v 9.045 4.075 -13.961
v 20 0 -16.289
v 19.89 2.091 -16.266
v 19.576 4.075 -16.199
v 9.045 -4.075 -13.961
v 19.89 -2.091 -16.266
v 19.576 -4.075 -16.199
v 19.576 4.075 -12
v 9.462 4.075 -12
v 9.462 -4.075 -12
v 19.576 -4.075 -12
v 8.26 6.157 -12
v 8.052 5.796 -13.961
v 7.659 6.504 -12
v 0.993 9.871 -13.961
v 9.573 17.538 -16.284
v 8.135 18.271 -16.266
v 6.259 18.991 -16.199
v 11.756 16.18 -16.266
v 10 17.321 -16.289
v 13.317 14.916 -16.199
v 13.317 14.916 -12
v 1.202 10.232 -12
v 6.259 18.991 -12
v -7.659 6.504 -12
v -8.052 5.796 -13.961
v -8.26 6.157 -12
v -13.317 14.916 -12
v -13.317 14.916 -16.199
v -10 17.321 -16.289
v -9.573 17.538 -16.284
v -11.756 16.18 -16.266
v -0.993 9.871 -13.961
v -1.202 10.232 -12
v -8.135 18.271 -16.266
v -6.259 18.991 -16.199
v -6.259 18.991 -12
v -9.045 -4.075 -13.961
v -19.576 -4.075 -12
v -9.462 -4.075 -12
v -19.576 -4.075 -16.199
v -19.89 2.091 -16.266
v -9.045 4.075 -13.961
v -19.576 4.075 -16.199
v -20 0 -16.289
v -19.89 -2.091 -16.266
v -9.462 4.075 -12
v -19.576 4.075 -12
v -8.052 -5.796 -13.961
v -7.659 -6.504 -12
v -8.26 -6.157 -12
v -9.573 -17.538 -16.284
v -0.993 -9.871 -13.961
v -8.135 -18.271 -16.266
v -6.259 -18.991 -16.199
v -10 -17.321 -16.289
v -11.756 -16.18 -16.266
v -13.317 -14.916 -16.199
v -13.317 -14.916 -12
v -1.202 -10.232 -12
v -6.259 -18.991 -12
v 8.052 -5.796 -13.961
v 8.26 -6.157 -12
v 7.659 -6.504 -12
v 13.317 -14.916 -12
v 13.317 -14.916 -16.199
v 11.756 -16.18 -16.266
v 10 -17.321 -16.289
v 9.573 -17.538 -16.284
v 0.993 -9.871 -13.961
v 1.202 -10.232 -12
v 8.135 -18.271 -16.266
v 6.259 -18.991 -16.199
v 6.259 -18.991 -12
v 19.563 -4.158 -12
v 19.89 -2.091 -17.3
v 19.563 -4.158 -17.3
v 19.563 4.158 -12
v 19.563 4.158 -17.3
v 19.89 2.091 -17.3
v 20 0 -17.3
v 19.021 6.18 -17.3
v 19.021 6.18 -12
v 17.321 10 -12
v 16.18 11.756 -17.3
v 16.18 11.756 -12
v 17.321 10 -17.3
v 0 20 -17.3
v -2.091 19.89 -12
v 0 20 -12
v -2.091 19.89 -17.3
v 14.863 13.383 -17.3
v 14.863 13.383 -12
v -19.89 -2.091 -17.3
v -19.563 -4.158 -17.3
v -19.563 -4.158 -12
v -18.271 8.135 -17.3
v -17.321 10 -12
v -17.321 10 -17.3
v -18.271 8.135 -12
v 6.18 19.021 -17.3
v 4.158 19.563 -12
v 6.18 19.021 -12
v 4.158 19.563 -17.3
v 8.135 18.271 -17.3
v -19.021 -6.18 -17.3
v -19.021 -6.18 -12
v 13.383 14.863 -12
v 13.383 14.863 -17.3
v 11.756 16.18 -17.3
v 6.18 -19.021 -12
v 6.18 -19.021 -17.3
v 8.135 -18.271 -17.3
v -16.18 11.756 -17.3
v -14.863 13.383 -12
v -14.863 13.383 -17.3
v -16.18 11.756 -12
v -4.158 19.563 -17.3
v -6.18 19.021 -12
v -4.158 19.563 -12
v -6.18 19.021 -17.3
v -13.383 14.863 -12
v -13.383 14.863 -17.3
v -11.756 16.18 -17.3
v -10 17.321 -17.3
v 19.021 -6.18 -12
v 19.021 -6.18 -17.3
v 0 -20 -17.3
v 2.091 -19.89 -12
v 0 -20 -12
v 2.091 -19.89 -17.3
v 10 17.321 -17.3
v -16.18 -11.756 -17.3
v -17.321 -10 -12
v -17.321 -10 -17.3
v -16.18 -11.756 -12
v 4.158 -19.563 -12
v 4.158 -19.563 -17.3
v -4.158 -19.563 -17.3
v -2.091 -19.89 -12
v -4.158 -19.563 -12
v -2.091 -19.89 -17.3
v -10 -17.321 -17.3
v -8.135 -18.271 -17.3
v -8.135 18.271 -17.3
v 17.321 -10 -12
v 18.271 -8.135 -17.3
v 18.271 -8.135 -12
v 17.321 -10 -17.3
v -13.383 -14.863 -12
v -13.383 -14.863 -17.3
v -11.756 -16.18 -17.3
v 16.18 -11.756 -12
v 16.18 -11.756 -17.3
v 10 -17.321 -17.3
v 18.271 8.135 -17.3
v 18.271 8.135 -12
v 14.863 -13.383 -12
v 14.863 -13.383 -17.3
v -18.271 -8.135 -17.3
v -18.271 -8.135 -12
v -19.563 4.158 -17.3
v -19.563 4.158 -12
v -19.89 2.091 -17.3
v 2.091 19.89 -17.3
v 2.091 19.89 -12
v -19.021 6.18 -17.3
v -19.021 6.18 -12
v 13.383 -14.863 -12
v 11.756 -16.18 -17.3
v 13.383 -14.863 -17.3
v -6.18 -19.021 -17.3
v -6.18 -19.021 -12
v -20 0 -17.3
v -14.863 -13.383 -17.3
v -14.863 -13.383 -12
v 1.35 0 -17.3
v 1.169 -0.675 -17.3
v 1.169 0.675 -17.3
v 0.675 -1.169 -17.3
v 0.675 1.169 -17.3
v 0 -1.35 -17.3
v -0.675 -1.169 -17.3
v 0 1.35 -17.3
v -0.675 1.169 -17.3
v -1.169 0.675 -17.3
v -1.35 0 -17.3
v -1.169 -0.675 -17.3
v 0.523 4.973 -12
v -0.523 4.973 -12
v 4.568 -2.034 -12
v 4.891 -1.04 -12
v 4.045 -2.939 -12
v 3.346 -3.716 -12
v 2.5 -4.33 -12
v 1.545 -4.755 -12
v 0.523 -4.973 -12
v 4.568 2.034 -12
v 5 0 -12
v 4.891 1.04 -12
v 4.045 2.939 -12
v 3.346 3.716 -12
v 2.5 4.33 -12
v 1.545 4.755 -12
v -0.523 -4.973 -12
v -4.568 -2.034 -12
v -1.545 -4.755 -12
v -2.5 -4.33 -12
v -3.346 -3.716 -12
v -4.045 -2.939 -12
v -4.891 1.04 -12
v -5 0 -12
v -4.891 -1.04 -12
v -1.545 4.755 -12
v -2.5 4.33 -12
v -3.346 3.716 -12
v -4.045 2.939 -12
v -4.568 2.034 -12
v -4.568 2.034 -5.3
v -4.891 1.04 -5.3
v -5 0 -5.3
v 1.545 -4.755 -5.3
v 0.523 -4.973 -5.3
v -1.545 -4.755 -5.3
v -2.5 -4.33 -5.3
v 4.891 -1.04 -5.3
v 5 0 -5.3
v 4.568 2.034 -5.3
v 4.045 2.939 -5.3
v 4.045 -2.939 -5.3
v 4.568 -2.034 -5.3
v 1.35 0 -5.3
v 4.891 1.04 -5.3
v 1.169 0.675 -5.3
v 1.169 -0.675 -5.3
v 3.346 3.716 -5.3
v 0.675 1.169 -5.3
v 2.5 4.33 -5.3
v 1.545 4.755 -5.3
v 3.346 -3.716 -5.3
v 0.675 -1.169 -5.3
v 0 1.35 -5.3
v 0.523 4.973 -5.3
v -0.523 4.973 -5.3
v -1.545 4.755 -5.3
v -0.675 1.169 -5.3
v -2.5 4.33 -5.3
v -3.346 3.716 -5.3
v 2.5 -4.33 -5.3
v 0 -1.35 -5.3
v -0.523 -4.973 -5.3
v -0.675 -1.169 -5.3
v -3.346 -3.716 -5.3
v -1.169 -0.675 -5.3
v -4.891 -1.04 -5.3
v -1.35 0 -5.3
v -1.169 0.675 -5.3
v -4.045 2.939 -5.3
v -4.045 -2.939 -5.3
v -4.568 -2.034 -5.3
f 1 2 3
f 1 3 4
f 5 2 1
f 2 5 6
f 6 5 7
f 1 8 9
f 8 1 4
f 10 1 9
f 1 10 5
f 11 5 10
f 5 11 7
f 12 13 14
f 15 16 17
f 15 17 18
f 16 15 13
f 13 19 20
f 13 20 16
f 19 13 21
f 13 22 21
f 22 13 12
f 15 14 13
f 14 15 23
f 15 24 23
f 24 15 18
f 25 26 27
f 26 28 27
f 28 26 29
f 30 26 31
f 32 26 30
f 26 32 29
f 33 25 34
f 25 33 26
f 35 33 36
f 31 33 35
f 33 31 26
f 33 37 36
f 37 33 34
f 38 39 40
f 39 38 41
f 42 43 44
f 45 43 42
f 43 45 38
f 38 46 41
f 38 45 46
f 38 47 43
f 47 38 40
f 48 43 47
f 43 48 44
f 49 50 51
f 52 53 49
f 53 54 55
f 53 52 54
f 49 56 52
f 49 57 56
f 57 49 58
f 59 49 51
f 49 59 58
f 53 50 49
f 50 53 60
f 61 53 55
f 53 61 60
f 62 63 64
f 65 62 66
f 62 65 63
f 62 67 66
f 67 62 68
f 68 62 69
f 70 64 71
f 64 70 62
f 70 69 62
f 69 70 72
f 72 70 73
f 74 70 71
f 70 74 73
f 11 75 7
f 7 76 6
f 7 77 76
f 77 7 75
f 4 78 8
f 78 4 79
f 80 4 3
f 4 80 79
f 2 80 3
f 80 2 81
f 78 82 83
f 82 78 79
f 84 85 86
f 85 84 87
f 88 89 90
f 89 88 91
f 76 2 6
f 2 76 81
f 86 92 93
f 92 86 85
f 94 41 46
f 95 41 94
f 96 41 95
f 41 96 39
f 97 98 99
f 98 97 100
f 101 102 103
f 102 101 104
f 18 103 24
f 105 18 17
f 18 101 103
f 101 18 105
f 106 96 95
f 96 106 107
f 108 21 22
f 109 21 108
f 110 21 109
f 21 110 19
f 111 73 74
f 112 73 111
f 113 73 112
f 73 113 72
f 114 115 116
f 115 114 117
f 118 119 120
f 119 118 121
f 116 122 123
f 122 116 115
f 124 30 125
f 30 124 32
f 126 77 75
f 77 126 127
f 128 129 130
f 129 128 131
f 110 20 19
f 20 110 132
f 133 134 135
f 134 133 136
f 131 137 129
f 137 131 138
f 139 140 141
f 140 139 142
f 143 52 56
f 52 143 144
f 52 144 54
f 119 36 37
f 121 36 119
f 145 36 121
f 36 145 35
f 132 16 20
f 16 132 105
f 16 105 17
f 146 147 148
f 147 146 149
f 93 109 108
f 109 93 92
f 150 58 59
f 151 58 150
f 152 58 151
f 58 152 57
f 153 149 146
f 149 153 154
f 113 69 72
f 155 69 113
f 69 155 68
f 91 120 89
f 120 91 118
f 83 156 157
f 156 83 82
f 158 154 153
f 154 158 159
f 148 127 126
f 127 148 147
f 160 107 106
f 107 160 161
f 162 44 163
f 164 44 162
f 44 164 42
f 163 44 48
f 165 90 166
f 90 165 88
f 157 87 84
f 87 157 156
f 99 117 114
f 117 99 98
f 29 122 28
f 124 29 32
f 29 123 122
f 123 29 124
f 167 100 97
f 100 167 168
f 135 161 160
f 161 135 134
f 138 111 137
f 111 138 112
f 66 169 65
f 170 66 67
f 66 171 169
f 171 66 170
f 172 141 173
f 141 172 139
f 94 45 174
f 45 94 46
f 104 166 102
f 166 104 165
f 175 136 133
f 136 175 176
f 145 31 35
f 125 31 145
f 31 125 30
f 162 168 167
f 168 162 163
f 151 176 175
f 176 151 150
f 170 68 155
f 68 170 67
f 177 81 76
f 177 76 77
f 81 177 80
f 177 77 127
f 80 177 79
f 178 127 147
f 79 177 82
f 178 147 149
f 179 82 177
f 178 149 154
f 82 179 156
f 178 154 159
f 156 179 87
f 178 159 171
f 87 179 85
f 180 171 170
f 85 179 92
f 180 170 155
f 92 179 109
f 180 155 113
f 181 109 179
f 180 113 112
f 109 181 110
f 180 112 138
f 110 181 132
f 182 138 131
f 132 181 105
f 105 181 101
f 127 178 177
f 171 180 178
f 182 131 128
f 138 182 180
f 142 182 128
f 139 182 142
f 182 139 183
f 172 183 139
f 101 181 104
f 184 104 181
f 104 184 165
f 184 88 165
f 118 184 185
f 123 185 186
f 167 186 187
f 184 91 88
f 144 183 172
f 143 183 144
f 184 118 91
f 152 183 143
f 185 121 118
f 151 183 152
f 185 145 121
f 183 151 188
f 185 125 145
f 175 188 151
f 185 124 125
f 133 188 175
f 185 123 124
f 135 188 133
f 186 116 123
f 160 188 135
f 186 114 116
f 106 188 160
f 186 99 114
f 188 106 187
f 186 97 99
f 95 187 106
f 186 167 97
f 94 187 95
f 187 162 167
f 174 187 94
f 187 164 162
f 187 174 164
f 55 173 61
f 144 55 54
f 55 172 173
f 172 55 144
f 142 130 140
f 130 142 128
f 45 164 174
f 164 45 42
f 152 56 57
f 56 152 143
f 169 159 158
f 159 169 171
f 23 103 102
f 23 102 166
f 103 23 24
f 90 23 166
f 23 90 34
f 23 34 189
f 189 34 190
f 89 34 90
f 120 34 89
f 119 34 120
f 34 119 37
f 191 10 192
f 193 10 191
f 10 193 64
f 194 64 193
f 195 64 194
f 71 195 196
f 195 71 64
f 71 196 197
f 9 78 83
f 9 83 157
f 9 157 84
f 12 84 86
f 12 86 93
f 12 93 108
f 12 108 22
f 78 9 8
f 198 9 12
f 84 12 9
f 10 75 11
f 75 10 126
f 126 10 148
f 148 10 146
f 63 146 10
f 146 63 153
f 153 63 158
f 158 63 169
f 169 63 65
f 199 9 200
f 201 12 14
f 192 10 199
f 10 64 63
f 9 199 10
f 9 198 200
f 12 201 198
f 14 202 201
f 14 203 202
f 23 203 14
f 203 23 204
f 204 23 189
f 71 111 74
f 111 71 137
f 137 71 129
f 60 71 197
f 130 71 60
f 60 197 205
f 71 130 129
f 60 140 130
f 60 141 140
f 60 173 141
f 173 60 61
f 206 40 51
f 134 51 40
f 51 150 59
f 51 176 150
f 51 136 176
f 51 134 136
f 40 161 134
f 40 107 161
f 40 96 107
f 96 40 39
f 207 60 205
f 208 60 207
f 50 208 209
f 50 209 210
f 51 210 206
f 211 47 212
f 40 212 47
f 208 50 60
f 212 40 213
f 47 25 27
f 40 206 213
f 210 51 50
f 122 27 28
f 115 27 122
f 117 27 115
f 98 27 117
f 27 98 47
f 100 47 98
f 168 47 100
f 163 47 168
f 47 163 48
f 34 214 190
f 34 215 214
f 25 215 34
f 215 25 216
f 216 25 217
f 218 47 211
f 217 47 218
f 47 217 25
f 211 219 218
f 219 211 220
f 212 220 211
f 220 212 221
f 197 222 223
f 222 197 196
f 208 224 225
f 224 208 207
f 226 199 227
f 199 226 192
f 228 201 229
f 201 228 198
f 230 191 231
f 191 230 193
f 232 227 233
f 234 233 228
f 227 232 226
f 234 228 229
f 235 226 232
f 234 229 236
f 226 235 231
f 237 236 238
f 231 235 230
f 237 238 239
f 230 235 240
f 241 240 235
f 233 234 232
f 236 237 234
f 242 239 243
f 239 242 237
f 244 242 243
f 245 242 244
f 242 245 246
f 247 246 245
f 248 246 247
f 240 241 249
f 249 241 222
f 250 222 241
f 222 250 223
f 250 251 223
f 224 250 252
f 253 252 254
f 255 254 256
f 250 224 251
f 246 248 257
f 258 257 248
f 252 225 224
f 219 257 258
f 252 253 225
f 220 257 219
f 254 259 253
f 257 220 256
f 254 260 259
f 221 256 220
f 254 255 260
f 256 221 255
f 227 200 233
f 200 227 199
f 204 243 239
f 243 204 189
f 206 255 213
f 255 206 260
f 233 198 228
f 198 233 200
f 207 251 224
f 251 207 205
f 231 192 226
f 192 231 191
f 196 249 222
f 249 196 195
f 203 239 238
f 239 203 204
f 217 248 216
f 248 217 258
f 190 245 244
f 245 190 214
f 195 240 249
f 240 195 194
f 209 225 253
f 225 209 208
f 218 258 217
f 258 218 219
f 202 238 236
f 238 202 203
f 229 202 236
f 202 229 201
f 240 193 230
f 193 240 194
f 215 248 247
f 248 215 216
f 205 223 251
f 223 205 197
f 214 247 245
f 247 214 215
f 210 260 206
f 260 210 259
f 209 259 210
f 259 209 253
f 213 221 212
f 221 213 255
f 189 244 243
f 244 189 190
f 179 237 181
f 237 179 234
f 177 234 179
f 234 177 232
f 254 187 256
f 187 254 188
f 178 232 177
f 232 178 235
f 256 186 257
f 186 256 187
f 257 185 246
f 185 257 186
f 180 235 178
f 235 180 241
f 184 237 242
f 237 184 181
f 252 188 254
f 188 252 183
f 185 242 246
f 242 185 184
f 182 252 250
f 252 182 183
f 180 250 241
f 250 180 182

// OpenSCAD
angle=12;
offset=-2.3;

difference(){
translate([0,0,offset])cylinder(d=40,h=30,$fn=60,center=true);
cylinder(d=3.7,h=60,$fn=15,center=true);
for(i=[0:60:330]){
rotate([0,0,i])
rotate([0,angle,0])translate([21.75,0,0])
cube([20,8.15,23.55],center=true);
}
translate([0,0,-12])cylinder(d=50,h=30);
}
difference(){
translate([0,0,-17.3])cylinder(d=10,h=12,$fn=30);
cylinder(d=2.7,h=100,$fn=12,center=true);
}

//difference(){
//translate([0,0,offset])cylinder(d=40,h=28,$fn=60,center=true);
//cylinder(d=3.7,h=60,$fn=15,center=true);
//for(i=[0:60:330]){
//rotate([0,0,i])
//rotate([0,angle,0])translate([21.75,0,0])
//cube([20,8.15,23.55],center=true);
//}
//translate([0,0,-23])cylinder(d=50,h=30);
//}

%rotate([0,angle,0])translate([21.75,0,0])
cube([20,8.15,23.55],center=true);
